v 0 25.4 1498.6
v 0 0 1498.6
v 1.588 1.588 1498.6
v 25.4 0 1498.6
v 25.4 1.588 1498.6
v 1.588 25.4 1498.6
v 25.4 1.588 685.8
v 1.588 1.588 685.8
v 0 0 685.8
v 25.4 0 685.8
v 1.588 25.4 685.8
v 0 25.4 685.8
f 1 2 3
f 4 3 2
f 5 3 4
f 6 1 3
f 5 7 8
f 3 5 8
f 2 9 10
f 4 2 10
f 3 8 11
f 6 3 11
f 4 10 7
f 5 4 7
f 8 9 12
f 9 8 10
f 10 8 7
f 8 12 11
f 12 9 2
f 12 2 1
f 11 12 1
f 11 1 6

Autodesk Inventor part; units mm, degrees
ref_plane "YZ Plane" through (0, 0, 0) normal (1, 0, 0) x (0, 1, 0)
ref_plane "XZ Plane" through (0, 0, 0) normal (0, 1, 0) x (-1, 0, 0)
ref_plane "XY Plane" through (0, 0, 0) normal (0, 0, 1) x (1, 0, 0)
sketch "Sketch1" plane through (0, 0, 0) normal (0, 0, 1) x (1, 0, 0)
  line L0 (0, 0) -> (25.4, 0)
  line L1 (25.4, 0) -> (25.4, 1.5875)
  line L2 (25.4, 1.5875) -> (1.5875, 1.5875)
  line L3 (0, 0) -> (0, 25.4)
  line L4 (0, 25.4) -> (1.5875, 25.4)
  line L5 (1.5875, 1.5875) -> (1.5875, 25.4)
  dimension "d0" = 25.4
  dimension "d1" = 1.5875
  dimension "d2" = 25.4
  dimension "d3" = 1.5875
extrude "Extrusion1" add sketch "Sketch1" along normal blind 1498.6
sketch "Sketch2" plane through (0, 0, 1498.6) normal (0, 0, 1) x (1, 0, 0)
  line L0 (0, 0) -> (25.4, 0) projected
  line L1 (25.4, 0) -> (25.4, 1.5875) projected
  line L2 (25.4, 1.5875) -> (1.5875, 1.5875) projected
  line L3 (1.5875, 1.5875) -> (1.5875, 25.4) projected
  line L4 (1.5875, 25.4) -> (0, 25.4) projected
  line L5 (0, 25.4) -> (0, 0) projected
extrude "Extrusion2" cut sketch "Sketch2" against normal blind 812.8 keep common part
properties part number "32-LBracketVersaFrame-1111-2018"
